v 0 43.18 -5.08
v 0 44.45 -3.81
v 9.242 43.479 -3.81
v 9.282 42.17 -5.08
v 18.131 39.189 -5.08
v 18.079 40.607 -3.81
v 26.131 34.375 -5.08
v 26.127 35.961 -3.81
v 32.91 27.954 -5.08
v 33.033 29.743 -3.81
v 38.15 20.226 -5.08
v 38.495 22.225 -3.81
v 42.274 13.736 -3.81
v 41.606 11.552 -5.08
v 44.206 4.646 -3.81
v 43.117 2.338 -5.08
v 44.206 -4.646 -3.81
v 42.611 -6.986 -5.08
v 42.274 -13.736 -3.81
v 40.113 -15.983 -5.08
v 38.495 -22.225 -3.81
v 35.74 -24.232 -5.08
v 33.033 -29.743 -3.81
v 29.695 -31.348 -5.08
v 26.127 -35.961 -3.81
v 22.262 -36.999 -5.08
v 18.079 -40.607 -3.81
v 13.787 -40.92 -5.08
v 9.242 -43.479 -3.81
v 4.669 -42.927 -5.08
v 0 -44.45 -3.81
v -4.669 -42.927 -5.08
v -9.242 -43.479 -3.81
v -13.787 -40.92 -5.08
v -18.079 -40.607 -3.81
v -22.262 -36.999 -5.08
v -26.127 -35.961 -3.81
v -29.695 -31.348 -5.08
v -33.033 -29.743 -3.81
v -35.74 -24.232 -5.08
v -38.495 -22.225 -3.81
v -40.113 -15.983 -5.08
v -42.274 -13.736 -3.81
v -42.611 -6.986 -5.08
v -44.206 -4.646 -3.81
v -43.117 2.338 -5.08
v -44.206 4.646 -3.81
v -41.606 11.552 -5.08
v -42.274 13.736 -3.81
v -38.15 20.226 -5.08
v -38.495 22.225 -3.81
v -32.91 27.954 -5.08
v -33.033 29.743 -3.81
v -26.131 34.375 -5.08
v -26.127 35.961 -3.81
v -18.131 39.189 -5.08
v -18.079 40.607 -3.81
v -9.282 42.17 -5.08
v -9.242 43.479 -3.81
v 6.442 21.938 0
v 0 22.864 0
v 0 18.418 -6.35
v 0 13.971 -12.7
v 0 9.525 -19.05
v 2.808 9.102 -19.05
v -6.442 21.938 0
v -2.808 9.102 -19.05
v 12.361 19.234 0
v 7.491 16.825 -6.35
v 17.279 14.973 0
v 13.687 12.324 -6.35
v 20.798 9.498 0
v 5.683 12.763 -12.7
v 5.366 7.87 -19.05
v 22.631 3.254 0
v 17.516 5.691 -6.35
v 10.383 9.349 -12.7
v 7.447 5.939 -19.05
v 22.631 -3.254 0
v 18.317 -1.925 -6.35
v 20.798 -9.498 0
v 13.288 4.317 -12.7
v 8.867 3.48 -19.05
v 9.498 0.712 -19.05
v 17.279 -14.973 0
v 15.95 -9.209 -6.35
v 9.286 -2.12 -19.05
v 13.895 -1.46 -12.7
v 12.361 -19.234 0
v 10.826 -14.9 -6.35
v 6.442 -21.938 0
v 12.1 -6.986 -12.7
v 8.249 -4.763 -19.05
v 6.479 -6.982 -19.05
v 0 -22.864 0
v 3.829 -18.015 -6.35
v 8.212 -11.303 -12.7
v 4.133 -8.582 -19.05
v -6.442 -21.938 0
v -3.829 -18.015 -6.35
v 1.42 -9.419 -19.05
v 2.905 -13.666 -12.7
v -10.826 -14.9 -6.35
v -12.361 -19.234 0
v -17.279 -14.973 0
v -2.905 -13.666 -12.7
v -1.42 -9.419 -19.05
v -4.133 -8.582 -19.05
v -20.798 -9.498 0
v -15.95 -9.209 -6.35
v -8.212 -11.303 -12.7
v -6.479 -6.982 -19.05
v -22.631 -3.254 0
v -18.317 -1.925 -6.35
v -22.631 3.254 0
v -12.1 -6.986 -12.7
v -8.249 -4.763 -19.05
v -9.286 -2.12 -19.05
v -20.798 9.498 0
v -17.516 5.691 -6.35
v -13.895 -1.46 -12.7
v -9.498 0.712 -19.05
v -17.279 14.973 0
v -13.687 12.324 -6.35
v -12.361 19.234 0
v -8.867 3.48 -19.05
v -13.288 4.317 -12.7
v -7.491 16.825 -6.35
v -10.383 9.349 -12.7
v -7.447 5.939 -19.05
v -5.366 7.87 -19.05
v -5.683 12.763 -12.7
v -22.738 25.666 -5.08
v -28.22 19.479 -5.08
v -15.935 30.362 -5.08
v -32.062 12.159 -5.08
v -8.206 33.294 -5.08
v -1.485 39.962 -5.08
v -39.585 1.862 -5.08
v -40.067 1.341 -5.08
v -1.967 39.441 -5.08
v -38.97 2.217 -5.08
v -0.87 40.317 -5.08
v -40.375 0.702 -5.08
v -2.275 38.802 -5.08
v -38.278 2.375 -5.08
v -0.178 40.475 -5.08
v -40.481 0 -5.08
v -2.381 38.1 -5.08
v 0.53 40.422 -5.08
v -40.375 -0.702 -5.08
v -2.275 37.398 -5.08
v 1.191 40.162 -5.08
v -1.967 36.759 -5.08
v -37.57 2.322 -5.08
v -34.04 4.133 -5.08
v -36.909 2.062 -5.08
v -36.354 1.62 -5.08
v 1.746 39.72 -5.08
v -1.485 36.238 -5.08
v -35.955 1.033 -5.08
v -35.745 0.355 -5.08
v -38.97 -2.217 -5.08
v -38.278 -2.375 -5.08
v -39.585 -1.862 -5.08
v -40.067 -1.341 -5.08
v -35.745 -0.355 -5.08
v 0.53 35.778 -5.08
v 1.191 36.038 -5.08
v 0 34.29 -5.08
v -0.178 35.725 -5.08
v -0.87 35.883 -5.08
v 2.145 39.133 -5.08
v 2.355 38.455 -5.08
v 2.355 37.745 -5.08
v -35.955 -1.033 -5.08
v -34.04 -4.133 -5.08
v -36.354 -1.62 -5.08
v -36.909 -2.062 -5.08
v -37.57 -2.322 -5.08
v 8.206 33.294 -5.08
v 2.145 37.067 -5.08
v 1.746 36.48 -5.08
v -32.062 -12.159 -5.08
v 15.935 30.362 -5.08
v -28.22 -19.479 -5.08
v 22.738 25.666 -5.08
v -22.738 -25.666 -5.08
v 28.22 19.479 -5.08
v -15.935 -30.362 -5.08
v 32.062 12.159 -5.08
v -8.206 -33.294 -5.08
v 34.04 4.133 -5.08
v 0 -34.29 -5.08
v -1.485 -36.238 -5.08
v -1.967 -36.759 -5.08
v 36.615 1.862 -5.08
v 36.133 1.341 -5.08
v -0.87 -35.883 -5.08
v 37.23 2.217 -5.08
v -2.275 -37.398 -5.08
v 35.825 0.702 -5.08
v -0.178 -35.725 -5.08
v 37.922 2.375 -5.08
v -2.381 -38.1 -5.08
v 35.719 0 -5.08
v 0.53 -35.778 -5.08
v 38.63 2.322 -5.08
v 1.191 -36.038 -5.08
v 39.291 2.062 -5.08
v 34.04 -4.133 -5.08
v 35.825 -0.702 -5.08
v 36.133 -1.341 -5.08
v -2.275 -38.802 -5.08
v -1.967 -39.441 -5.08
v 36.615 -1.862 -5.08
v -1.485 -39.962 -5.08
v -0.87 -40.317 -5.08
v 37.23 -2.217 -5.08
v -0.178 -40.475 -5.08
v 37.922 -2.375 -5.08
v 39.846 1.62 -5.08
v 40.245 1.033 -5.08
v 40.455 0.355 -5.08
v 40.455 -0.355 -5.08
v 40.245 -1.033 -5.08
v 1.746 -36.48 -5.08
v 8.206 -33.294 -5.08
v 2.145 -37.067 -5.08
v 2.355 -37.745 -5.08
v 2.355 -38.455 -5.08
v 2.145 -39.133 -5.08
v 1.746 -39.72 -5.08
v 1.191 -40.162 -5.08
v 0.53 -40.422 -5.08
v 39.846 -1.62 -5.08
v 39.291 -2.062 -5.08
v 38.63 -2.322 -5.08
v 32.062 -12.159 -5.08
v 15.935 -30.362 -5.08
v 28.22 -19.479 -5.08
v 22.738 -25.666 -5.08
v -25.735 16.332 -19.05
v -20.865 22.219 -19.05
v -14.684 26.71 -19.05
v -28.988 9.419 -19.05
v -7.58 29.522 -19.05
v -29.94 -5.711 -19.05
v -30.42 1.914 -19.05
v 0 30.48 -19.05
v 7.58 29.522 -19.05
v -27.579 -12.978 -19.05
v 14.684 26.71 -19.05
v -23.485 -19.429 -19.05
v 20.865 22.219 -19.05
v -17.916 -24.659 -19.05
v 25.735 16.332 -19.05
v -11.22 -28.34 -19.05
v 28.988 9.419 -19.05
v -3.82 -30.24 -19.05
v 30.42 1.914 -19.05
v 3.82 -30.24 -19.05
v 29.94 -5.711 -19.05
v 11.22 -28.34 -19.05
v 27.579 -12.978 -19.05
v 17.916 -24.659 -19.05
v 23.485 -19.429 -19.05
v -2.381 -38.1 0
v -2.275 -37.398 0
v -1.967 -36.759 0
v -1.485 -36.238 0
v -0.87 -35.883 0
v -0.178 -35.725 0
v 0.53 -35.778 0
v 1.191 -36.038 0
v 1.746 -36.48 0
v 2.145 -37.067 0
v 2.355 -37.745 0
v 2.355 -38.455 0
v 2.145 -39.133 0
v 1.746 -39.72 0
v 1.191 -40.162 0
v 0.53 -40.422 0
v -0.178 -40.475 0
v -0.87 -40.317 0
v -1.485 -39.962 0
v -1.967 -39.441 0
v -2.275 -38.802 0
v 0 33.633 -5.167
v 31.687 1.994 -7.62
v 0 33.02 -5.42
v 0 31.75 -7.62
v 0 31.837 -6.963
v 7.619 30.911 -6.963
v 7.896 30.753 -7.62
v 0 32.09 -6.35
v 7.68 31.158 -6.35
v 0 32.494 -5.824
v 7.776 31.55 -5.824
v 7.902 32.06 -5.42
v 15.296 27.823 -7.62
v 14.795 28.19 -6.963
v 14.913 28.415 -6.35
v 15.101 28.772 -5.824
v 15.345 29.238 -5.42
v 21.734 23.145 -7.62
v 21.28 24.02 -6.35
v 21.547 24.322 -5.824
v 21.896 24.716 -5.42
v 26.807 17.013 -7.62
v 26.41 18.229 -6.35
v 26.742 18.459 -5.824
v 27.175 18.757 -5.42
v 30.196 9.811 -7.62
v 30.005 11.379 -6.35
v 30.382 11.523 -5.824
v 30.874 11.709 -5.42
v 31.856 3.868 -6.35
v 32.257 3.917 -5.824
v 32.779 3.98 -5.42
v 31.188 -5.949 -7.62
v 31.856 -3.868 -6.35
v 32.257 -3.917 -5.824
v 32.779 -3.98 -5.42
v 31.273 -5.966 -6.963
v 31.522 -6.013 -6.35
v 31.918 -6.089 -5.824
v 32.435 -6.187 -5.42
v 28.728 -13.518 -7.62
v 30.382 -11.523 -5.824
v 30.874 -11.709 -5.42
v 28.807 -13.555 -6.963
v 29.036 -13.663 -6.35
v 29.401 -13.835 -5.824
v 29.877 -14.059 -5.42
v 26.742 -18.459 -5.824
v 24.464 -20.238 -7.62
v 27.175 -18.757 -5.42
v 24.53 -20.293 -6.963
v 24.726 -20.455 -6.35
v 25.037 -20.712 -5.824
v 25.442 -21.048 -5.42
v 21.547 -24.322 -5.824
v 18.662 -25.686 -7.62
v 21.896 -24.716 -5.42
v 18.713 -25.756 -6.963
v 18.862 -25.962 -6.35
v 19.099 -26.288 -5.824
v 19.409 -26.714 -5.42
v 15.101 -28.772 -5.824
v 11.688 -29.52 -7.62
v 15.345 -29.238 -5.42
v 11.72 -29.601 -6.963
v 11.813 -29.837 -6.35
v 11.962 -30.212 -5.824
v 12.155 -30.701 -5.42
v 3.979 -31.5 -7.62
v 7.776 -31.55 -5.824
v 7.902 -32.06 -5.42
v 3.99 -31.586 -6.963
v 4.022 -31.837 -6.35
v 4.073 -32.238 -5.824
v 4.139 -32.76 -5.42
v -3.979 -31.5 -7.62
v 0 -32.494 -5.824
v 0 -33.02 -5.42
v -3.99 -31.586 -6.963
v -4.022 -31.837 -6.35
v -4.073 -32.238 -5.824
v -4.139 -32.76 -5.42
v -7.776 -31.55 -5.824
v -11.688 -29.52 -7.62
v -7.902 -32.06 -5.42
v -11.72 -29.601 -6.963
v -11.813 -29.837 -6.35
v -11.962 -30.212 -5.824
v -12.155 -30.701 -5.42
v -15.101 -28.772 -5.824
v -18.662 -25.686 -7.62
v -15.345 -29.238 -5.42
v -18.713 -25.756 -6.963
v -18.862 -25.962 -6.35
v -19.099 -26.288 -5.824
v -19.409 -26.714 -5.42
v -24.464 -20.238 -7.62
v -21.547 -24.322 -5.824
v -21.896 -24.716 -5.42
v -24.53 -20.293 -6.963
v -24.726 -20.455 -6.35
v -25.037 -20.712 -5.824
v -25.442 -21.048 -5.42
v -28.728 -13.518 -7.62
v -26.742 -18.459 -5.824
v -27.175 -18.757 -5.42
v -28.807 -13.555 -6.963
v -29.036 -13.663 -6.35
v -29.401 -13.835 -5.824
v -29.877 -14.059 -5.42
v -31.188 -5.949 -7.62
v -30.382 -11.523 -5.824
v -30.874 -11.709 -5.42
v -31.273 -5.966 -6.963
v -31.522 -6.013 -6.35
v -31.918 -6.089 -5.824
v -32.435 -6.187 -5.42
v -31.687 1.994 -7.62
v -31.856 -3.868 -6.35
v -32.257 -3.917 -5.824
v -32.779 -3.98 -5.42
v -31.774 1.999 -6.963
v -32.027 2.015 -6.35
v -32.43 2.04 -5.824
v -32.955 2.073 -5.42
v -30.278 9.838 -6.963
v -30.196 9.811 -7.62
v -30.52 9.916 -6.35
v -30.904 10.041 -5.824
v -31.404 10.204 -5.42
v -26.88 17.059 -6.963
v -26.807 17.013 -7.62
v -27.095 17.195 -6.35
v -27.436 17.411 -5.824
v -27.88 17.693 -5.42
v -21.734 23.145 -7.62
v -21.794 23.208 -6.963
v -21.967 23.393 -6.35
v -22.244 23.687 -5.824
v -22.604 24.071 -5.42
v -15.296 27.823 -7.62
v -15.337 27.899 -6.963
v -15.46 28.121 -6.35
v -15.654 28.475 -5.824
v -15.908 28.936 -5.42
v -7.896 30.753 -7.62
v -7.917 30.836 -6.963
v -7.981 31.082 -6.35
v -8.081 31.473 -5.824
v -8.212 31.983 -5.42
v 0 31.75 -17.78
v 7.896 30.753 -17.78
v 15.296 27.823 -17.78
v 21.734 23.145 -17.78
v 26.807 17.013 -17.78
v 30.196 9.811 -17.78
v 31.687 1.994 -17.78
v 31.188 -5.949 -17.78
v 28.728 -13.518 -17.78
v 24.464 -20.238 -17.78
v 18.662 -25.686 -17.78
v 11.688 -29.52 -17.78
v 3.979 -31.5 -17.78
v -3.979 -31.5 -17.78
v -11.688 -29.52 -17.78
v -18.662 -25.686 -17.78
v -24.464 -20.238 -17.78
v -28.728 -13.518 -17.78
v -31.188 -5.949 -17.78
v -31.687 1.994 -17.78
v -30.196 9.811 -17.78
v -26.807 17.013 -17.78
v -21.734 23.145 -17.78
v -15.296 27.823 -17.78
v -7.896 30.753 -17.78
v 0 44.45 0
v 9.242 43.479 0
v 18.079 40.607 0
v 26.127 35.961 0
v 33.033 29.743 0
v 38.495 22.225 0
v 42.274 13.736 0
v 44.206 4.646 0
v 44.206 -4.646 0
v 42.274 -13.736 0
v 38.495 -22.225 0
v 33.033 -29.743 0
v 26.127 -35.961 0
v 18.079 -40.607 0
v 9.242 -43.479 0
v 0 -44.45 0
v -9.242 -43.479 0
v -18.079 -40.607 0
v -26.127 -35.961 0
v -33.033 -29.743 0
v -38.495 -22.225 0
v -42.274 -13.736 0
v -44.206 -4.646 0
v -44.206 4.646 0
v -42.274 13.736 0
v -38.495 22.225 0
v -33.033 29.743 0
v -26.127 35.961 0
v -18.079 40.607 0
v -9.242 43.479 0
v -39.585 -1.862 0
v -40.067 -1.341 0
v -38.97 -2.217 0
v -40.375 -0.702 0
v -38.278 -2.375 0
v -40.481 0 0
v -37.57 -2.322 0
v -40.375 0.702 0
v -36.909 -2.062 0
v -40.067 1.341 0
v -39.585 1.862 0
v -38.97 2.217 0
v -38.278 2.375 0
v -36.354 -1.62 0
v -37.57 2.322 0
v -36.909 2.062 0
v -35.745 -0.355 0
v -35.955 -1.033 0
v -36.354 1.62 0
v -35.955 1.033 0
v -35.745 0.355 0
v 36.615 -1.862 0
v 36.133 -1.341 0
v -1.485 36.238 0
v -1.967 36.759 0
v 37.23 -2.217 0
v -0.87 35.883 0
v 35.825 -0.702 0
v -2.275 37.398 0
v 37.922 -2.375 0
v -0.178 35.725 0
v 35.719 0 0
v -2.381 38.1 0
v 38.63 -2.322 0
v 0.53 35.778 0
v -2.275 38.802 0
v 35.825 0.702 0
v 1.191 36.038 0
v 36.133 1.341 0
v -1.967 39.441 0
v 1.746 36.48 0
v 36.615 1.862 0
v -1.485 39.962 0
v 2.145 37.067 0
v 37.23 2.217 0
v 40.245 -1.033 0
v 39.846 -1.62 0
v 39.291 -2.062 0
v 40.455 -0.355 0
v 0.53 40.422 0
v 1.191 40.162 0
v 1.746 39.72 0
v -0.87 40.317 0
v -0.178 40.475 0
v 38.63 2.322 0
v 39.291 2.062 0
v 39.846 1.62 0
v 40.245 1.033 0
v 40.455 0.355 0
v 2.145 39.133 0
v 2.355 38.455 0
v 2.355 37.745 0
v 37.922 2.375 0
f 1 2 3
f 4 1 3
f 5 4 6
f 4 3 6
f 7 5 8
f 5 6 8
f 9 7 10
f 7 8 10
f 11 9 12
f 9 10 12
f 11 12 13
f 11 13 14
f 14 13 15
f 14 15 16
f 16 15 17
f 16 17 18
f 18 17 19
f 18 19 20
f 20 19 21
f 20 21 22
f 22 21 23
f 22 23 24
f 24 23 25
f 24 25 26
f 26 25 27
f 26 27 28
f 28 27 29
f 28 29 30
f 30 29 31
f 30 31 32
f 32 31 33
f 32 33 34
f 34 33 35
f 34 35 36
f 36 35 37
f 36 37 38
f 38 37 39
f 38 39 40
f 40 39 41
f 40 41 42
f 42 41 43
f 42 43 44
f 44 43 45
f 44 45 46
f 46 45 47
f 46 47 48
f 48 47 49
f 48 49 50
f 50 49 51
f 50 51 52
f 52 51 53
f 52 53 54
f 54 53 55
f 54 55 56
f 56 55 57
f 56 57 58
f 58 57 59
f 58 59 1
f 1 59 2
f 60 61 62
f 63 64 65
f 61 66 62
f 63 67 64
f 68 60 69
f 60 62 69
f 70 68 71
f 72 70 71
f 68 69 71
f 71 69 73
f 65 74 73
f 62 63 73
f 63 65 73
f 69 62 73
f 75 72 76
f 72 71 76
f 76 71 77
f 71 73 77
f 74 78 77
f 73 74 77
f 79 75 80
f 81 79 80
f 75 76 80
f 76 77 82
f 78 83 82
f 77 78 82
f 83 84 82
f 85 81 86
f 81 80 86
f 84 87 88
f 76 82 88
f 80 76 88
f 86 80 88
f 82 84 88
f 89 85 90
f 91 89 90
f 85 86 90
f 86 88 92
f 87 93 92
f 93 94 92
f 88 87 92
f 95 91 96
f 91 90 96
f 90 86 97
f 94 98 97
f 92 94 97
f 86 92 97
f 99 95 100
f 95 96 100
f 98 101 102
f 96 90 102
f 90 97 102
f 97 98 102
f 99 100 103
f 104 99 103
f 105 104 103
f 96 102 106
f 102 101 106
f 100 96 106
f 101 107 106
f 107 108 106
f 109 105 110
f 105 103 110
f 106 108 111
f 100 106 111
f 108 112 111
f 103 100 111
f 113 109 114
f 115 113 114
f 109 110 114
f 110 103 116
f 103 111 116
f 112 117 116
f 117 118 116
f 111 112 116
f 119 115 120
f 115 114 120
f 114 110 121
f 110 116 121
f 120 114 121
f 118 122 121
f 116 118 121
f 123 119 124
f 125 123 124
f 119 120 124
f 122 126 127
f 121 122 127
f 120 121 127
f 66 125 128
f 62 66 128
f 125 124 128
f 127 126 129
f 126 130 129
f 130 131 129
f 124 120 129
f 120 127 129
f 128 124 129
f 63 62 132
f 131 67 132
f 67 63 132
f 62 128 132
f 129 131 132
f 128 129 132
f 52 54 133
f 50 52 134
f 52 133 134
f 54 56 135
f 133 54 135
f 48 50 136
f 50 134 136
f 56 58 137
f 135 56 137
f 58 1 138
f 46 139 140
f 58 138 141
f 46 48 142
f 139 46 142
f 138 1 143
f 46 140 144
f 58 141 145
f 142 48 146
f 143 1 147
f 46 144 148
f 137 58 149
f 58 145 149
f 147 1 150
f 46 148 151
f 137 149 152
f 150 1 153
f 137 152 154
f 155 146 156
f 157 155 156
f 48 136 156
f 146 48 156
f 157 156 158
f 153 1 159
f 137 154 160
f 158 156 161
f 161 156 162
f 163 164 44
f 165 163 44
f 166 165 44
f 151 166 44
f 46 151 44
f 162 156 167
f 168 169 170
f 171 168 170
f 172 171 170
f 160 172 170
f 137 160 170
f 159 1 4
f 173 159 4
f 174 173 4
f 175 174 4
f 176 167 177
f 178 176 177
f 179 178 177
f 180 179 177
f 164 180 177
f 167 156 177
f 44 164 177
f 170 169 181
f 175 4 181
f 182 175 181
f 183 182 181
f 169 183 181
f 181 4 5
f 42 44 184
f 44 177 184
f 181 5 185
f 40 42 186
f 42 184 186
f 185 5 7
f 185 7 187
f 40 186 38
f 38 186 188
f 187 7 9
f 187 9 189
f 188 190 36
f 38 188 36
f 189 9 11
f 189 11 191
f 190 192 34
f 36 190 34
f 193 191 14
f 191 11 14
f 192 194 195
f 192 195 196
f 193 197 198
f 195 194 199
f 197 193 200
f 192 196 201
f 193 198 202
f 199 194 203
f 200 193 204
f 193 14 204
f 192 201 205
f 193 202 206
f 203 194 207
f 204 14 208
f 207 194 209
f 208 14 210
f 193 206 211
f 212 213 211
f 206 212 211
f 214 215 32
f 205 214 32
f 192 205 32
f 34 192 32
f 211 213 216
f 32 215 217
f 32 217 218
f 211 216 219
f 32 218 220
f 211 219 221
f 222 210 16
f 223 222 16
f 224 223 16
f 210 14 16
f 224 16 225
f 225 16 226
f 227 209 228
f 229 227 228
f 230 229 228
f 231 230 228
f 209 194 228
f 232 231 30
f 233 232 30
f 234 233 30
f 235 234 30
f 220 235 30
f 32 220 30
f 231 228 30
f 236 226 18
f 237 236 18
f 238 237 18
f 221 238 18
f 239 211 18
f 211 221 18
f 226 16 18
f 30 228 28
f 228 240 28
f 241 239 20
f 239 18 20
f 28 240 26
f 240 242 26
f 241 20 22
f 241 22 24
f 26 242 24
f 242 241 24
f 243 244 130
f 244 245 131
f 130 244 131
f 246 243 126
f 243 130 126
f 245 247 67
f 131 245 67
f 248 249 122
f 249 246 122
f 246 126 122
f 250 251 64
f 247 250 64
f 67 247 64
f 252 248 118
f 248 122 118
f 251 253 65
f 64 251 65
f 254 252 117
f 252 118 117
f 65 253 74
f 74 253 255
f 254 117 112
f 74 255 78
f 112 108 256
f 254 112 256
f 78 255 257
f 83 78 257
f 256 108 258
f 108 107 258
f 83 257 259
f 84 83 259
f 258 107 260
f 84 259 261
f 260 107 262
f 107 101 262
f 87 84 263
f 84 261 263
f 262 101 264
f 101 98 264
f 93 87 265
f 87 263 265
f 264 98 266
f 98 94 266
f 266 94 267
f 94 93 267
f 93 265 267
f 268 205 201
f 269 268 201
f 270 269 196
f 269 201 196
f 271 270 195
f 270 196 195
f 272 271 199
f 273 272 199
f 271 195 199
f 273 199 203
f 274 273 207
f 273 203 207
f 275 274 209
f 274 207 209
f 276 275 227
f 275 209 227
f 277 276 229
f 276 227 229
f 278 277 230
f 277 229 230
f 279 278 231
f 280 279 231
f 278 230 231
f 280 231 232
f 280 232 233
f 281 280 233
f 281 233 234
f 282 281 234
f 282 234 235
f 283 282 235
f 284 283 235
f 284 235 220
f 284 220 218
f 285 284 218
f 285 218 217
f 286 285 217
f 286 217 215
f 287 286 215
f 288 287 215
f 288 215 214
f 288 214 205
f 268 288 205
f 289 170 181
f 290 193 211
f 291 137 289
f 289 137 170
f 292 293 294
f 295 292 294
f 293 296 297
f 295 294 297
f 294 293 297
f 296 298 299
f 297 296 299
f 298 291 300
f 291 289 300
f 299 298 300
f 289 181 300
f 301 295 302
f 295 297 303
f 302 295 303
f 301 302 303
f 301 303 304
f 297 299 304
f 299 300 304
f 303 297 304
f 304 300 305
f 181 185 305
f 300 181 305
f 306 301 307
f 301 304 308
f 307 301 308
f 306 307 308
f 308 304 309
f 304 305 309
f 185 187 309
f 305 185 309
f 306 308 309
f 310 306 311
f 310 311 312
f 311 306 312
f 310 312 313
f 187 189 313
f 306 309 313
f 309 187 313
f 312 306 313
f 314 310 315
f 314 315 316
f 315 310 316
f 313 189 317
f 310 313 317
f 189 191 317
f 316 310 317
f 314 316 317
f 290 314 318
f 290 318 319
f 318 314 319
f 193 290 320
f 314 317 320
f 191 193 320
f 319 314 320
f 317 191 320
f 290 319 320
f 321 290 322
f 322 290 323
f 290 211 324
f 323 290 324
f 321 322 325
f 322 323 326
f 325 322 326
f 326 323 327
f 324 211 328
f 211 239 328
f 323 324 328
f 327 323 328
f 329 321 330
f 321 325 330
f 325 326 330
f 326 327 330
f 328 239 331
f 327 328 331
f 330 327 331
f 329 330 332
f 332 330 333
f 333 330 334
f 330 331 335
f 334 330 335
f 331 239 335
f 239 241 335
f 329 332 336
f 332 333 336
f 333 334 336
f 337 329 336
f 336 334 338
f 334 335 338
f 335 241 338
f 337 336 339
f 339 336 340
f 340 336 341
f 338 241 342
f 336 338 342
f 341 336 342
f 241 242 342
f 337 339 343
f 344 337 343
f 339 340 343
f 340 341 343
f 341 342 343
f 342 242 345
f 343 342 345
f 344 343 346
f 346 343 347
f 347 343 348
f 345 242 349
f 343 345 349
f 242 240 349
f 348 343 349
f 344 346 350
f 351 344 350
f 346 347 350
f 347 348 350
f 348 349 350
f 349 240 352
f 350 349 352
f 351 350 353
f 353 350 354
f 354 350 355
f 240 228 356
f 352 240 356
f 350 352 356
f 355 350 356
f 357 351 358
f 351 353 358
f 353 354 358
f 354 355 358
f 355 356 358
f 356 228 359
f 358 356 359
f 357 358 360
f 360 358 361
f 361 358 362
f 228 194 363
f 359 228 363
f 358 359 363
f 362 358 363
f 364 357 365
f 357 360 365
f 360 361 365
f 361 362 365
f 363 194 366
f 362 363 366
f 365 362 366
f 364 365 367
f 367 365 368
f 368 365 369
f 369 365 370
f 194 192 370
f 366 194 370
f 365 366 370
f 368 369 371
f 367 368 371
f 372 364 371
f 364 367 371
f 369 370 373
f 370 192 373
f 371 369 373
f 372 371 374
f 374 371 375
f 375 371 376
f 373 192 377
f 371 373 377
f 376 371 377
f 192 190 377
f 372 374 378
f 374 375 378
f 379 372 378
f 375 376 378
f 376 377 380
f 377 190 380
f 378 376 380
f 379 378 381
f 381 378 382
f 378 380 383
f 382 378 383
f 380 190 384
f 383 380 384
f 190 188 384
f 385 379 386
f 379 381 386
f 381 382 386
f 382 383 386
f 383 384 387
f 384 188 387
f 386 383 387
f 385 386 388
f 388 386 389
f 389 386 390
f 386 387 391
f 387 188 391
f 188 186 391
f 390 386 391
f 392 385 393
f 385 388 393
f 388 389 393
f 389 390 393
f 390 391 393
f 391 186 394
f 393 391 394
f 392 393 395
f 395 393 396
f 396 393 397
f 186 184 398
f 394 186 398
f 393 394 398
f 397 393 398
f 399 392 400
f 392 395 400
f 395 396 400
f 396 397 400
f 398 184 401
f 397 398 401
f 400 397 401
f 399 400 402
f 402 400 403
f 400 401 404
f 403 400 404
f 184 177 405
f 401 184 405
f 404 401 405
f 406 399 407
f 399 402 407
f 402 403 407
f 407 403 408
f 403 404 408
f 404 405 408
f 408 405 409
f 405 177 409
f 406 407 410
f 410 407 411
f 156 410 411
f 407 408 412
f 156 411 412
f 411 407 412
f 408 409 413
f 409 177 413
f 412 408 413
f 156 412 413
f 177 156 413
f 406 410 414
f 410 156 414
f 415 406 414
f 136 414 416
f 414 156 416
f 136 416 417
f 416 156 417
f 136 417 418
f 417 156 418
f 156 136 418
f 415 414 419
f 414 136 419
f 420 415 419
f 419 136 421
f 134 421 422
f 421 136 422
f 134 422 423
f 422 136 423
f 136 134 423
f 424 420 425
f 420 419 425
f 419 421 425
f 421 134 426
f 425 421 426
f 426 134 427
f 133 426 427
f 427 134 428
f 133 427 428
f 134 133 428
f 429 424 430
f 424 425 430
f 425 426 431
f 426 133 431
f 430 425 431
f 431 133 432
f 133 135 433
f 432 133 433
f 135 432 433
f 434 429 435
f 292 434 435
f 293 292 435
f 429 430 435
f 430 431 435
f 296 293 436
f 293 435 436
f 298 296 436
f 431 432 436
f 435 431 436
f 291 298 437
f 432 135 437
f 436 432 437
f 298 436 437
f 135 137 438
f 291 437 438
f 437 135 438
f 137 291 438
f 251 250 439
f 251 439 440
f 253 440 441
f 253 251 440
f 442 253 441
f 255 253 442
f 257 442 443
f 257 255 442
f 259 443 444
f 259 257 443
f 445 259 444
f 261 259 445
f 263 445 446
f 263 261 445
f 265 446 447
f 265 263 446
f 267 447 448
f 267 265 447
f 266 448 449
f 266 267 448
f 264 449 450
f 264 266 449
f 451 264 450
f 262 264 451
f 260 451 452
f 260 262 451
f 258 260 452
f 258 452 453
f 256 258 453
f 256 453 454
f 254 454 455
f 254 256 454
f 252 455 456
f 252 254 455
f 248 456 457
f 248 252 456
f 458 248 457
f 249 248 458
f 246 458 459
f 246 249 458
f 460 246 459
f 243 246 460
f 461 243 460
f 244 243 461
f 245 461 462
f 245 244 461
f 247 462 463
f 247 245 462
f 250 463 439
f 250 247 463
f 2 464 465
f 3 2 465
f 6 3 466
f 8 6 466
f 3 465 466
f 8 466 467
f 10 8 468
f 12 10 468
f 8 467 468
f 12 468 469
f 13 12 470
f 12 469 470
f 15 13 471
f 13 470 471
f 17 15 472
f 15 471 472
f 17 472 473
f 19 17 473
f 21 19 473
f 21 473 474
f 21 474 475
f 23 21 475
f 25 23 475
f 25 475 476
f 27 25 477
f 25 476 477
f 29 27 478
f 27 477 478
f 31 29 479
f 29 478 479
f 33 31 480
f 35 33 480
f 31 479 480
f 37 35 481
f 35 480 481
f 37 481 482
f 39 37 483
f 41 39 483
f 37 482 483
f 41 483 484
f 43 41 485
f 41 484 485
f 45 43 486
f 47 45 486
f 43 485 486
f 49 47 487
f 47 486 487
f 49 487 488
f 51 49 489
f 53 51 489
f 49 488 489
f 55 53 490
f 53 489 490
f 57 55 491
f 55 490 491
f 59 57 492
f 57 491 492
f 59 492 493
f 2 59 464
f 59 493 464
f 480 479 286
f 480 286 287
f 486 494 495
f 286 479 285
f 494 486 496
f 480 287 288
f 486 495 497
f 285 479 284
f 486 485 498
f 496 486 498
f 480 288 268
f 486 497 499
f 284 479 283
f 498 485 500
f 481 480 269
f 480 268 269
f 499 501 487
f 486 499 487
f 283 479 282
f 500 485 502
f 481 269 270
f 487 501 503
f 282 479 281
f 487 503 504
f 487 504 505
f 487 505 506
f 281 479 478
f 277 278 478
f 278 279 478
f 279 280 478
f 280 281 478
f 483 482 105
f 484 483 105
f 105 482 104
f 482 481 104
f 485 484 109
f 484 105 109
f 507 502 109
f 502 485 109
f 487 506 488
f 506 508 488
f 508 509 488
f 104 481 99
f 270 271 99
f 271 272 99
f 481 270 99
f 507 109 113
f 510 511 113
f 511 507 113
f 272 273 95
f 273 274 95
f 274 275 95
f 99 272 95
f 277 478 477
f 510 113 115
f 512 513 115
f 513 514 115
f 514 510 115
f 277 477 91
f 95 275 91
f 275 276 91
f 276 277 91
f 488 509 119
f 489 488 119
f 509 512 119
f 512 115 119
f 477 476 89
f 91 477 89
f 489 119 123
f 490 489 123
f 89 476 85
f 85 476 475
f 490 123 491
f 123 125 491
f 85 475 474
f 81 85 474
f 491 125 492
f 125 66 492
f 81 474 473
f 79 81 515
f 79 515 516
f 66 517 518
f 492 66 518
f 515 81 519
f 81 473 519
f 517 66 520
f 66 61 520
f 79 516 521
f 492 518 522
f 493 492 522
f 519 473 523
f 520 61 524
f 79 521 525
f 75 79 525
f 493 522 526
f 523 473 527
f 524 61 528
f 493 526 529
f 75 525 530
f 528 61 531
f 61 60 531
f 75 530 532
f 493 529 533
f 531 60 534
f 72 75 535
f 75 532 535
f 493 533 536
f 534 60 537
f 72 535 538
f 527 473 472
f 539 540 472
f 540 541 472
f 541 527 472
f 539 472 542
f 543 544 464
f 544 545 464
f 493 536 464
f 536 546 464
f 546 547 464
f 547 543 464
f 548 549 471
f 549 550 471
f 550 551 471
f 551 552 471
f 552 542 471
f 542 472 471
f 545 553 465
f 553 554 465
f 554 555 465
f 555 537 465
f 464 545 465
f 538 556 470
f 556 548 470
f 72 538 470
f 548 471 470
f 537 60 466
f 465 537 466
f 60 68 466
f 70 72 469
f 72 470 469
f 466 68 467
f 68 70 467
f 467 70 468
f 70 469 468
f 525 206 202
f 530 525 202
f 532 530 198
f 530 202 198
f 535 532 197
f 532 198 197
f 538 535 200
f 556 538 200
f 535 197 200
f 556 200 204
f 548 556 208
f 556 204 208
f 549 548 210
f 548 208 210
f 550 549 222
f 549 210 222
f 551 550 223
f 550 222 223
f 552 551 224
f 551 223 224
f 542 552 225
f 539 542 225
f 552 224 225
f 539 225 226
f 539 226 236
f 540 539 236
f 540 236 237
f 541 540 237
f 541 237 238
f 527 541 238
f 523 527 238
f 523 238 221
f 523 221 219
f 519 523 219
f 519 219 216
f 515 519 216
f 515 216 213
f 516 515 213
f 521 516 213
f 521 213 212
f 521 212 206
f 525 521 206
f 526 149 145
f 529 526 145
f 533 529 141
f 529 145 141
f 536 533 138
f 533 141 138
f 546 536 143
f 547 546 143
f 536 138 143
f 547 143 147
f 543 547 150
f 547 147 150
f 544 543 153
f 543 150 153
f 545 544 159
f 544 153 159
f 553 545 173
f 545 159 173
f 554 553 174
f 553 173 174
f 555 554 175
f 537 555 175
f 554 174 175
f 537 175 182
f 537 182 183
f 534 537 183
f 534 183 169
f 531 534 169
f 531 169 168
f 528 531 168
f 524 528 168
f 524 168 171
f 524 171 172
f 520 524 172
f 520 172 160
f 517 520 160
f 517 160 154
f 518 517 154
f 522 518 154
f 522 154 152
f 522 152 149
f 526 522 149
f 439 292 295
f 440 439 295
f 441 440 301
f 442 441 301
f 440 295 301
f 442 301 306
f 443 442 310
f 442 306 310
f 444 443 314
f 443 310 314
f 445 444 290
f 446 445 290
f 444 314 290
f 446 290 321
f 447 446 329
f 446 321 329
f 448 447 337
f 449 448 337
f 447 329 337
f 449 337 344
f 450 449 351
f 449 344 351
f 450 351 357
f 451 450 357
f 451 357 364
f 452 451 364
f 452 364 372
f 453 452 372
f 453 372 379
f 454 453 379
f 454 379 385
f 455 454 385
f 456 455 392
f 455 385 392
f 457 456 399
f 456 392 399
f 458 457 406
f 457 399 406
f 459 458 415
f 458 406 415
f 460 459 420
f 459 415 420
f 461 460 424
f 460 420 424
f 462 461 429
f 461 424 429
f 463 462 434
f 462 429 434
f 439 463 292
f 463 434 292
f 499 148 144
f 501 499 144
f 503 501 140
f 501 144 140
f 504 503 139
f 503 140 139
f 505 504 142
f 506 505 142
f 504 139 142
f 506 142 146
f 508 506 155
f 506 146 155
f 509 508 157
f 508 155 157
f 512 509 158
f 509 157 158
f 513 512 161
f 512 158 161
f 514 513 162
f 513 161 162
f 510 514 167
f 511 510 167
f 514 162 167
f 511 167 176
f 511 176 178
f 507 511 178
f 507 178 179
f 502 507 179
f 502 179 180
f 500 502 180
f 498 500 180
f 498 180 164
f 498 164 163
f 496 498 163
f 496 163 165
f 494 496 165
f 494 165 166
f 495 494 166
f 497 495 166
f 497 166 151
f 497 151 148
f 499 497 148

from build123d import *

# Parameters (mm, degrees)
F_3_16_0_1875_DIAMETER_HOLE1_D = 4.7625
FILLET1_R                      = 2.54
CHAMFER1_SIZE                  = 1.27


with BuildPart() as part:
    # Sketch1 → Revolve1 (revolve)
    with BuildSketch(Plane(origin=(0, 0, 0), x_dir=(0, 0, -1), z_dir=(1, 0, 0))):
        Polygon((0, 22.863953603), (19.05, 9.525), (19.05, 31.75), (5.08, 31.75), (5.08, 44.45), (0, 44.45), align=None)
    revolve(axis=Axis((0, 0, 18.454150881), (0, 0, -1)))

    # 3/16 (0.1875) Diameter Hole1 (through all)
    with Locations(Plane.XY):
        with Locations((0, 38.1), (38.1, 0), (0, -38.1), (-38.1, 0), (0, 0)):
            Hole(F_3_16_0_1875_DIAMETER_HOLE1_D / 2)

    # Fillet1
    fillet1_edges = [part.edges().sort_by_distance(p)[0] for p in [
        (0, -31.75, -5.08),
    ]]
    fillet(fillet1_edges, radius=FILLET1_R)

    # Chamfer1
    chamfer1_edges = [part.edges().sort_by_distance(p)[0] for p in [
        (0, -31.75, -19.05),
        (0, -44.45, -5.08),
    ]]
    chamfer(chamfer1_edges, length=CHAMFER1_SIZE)


solid = part.part
